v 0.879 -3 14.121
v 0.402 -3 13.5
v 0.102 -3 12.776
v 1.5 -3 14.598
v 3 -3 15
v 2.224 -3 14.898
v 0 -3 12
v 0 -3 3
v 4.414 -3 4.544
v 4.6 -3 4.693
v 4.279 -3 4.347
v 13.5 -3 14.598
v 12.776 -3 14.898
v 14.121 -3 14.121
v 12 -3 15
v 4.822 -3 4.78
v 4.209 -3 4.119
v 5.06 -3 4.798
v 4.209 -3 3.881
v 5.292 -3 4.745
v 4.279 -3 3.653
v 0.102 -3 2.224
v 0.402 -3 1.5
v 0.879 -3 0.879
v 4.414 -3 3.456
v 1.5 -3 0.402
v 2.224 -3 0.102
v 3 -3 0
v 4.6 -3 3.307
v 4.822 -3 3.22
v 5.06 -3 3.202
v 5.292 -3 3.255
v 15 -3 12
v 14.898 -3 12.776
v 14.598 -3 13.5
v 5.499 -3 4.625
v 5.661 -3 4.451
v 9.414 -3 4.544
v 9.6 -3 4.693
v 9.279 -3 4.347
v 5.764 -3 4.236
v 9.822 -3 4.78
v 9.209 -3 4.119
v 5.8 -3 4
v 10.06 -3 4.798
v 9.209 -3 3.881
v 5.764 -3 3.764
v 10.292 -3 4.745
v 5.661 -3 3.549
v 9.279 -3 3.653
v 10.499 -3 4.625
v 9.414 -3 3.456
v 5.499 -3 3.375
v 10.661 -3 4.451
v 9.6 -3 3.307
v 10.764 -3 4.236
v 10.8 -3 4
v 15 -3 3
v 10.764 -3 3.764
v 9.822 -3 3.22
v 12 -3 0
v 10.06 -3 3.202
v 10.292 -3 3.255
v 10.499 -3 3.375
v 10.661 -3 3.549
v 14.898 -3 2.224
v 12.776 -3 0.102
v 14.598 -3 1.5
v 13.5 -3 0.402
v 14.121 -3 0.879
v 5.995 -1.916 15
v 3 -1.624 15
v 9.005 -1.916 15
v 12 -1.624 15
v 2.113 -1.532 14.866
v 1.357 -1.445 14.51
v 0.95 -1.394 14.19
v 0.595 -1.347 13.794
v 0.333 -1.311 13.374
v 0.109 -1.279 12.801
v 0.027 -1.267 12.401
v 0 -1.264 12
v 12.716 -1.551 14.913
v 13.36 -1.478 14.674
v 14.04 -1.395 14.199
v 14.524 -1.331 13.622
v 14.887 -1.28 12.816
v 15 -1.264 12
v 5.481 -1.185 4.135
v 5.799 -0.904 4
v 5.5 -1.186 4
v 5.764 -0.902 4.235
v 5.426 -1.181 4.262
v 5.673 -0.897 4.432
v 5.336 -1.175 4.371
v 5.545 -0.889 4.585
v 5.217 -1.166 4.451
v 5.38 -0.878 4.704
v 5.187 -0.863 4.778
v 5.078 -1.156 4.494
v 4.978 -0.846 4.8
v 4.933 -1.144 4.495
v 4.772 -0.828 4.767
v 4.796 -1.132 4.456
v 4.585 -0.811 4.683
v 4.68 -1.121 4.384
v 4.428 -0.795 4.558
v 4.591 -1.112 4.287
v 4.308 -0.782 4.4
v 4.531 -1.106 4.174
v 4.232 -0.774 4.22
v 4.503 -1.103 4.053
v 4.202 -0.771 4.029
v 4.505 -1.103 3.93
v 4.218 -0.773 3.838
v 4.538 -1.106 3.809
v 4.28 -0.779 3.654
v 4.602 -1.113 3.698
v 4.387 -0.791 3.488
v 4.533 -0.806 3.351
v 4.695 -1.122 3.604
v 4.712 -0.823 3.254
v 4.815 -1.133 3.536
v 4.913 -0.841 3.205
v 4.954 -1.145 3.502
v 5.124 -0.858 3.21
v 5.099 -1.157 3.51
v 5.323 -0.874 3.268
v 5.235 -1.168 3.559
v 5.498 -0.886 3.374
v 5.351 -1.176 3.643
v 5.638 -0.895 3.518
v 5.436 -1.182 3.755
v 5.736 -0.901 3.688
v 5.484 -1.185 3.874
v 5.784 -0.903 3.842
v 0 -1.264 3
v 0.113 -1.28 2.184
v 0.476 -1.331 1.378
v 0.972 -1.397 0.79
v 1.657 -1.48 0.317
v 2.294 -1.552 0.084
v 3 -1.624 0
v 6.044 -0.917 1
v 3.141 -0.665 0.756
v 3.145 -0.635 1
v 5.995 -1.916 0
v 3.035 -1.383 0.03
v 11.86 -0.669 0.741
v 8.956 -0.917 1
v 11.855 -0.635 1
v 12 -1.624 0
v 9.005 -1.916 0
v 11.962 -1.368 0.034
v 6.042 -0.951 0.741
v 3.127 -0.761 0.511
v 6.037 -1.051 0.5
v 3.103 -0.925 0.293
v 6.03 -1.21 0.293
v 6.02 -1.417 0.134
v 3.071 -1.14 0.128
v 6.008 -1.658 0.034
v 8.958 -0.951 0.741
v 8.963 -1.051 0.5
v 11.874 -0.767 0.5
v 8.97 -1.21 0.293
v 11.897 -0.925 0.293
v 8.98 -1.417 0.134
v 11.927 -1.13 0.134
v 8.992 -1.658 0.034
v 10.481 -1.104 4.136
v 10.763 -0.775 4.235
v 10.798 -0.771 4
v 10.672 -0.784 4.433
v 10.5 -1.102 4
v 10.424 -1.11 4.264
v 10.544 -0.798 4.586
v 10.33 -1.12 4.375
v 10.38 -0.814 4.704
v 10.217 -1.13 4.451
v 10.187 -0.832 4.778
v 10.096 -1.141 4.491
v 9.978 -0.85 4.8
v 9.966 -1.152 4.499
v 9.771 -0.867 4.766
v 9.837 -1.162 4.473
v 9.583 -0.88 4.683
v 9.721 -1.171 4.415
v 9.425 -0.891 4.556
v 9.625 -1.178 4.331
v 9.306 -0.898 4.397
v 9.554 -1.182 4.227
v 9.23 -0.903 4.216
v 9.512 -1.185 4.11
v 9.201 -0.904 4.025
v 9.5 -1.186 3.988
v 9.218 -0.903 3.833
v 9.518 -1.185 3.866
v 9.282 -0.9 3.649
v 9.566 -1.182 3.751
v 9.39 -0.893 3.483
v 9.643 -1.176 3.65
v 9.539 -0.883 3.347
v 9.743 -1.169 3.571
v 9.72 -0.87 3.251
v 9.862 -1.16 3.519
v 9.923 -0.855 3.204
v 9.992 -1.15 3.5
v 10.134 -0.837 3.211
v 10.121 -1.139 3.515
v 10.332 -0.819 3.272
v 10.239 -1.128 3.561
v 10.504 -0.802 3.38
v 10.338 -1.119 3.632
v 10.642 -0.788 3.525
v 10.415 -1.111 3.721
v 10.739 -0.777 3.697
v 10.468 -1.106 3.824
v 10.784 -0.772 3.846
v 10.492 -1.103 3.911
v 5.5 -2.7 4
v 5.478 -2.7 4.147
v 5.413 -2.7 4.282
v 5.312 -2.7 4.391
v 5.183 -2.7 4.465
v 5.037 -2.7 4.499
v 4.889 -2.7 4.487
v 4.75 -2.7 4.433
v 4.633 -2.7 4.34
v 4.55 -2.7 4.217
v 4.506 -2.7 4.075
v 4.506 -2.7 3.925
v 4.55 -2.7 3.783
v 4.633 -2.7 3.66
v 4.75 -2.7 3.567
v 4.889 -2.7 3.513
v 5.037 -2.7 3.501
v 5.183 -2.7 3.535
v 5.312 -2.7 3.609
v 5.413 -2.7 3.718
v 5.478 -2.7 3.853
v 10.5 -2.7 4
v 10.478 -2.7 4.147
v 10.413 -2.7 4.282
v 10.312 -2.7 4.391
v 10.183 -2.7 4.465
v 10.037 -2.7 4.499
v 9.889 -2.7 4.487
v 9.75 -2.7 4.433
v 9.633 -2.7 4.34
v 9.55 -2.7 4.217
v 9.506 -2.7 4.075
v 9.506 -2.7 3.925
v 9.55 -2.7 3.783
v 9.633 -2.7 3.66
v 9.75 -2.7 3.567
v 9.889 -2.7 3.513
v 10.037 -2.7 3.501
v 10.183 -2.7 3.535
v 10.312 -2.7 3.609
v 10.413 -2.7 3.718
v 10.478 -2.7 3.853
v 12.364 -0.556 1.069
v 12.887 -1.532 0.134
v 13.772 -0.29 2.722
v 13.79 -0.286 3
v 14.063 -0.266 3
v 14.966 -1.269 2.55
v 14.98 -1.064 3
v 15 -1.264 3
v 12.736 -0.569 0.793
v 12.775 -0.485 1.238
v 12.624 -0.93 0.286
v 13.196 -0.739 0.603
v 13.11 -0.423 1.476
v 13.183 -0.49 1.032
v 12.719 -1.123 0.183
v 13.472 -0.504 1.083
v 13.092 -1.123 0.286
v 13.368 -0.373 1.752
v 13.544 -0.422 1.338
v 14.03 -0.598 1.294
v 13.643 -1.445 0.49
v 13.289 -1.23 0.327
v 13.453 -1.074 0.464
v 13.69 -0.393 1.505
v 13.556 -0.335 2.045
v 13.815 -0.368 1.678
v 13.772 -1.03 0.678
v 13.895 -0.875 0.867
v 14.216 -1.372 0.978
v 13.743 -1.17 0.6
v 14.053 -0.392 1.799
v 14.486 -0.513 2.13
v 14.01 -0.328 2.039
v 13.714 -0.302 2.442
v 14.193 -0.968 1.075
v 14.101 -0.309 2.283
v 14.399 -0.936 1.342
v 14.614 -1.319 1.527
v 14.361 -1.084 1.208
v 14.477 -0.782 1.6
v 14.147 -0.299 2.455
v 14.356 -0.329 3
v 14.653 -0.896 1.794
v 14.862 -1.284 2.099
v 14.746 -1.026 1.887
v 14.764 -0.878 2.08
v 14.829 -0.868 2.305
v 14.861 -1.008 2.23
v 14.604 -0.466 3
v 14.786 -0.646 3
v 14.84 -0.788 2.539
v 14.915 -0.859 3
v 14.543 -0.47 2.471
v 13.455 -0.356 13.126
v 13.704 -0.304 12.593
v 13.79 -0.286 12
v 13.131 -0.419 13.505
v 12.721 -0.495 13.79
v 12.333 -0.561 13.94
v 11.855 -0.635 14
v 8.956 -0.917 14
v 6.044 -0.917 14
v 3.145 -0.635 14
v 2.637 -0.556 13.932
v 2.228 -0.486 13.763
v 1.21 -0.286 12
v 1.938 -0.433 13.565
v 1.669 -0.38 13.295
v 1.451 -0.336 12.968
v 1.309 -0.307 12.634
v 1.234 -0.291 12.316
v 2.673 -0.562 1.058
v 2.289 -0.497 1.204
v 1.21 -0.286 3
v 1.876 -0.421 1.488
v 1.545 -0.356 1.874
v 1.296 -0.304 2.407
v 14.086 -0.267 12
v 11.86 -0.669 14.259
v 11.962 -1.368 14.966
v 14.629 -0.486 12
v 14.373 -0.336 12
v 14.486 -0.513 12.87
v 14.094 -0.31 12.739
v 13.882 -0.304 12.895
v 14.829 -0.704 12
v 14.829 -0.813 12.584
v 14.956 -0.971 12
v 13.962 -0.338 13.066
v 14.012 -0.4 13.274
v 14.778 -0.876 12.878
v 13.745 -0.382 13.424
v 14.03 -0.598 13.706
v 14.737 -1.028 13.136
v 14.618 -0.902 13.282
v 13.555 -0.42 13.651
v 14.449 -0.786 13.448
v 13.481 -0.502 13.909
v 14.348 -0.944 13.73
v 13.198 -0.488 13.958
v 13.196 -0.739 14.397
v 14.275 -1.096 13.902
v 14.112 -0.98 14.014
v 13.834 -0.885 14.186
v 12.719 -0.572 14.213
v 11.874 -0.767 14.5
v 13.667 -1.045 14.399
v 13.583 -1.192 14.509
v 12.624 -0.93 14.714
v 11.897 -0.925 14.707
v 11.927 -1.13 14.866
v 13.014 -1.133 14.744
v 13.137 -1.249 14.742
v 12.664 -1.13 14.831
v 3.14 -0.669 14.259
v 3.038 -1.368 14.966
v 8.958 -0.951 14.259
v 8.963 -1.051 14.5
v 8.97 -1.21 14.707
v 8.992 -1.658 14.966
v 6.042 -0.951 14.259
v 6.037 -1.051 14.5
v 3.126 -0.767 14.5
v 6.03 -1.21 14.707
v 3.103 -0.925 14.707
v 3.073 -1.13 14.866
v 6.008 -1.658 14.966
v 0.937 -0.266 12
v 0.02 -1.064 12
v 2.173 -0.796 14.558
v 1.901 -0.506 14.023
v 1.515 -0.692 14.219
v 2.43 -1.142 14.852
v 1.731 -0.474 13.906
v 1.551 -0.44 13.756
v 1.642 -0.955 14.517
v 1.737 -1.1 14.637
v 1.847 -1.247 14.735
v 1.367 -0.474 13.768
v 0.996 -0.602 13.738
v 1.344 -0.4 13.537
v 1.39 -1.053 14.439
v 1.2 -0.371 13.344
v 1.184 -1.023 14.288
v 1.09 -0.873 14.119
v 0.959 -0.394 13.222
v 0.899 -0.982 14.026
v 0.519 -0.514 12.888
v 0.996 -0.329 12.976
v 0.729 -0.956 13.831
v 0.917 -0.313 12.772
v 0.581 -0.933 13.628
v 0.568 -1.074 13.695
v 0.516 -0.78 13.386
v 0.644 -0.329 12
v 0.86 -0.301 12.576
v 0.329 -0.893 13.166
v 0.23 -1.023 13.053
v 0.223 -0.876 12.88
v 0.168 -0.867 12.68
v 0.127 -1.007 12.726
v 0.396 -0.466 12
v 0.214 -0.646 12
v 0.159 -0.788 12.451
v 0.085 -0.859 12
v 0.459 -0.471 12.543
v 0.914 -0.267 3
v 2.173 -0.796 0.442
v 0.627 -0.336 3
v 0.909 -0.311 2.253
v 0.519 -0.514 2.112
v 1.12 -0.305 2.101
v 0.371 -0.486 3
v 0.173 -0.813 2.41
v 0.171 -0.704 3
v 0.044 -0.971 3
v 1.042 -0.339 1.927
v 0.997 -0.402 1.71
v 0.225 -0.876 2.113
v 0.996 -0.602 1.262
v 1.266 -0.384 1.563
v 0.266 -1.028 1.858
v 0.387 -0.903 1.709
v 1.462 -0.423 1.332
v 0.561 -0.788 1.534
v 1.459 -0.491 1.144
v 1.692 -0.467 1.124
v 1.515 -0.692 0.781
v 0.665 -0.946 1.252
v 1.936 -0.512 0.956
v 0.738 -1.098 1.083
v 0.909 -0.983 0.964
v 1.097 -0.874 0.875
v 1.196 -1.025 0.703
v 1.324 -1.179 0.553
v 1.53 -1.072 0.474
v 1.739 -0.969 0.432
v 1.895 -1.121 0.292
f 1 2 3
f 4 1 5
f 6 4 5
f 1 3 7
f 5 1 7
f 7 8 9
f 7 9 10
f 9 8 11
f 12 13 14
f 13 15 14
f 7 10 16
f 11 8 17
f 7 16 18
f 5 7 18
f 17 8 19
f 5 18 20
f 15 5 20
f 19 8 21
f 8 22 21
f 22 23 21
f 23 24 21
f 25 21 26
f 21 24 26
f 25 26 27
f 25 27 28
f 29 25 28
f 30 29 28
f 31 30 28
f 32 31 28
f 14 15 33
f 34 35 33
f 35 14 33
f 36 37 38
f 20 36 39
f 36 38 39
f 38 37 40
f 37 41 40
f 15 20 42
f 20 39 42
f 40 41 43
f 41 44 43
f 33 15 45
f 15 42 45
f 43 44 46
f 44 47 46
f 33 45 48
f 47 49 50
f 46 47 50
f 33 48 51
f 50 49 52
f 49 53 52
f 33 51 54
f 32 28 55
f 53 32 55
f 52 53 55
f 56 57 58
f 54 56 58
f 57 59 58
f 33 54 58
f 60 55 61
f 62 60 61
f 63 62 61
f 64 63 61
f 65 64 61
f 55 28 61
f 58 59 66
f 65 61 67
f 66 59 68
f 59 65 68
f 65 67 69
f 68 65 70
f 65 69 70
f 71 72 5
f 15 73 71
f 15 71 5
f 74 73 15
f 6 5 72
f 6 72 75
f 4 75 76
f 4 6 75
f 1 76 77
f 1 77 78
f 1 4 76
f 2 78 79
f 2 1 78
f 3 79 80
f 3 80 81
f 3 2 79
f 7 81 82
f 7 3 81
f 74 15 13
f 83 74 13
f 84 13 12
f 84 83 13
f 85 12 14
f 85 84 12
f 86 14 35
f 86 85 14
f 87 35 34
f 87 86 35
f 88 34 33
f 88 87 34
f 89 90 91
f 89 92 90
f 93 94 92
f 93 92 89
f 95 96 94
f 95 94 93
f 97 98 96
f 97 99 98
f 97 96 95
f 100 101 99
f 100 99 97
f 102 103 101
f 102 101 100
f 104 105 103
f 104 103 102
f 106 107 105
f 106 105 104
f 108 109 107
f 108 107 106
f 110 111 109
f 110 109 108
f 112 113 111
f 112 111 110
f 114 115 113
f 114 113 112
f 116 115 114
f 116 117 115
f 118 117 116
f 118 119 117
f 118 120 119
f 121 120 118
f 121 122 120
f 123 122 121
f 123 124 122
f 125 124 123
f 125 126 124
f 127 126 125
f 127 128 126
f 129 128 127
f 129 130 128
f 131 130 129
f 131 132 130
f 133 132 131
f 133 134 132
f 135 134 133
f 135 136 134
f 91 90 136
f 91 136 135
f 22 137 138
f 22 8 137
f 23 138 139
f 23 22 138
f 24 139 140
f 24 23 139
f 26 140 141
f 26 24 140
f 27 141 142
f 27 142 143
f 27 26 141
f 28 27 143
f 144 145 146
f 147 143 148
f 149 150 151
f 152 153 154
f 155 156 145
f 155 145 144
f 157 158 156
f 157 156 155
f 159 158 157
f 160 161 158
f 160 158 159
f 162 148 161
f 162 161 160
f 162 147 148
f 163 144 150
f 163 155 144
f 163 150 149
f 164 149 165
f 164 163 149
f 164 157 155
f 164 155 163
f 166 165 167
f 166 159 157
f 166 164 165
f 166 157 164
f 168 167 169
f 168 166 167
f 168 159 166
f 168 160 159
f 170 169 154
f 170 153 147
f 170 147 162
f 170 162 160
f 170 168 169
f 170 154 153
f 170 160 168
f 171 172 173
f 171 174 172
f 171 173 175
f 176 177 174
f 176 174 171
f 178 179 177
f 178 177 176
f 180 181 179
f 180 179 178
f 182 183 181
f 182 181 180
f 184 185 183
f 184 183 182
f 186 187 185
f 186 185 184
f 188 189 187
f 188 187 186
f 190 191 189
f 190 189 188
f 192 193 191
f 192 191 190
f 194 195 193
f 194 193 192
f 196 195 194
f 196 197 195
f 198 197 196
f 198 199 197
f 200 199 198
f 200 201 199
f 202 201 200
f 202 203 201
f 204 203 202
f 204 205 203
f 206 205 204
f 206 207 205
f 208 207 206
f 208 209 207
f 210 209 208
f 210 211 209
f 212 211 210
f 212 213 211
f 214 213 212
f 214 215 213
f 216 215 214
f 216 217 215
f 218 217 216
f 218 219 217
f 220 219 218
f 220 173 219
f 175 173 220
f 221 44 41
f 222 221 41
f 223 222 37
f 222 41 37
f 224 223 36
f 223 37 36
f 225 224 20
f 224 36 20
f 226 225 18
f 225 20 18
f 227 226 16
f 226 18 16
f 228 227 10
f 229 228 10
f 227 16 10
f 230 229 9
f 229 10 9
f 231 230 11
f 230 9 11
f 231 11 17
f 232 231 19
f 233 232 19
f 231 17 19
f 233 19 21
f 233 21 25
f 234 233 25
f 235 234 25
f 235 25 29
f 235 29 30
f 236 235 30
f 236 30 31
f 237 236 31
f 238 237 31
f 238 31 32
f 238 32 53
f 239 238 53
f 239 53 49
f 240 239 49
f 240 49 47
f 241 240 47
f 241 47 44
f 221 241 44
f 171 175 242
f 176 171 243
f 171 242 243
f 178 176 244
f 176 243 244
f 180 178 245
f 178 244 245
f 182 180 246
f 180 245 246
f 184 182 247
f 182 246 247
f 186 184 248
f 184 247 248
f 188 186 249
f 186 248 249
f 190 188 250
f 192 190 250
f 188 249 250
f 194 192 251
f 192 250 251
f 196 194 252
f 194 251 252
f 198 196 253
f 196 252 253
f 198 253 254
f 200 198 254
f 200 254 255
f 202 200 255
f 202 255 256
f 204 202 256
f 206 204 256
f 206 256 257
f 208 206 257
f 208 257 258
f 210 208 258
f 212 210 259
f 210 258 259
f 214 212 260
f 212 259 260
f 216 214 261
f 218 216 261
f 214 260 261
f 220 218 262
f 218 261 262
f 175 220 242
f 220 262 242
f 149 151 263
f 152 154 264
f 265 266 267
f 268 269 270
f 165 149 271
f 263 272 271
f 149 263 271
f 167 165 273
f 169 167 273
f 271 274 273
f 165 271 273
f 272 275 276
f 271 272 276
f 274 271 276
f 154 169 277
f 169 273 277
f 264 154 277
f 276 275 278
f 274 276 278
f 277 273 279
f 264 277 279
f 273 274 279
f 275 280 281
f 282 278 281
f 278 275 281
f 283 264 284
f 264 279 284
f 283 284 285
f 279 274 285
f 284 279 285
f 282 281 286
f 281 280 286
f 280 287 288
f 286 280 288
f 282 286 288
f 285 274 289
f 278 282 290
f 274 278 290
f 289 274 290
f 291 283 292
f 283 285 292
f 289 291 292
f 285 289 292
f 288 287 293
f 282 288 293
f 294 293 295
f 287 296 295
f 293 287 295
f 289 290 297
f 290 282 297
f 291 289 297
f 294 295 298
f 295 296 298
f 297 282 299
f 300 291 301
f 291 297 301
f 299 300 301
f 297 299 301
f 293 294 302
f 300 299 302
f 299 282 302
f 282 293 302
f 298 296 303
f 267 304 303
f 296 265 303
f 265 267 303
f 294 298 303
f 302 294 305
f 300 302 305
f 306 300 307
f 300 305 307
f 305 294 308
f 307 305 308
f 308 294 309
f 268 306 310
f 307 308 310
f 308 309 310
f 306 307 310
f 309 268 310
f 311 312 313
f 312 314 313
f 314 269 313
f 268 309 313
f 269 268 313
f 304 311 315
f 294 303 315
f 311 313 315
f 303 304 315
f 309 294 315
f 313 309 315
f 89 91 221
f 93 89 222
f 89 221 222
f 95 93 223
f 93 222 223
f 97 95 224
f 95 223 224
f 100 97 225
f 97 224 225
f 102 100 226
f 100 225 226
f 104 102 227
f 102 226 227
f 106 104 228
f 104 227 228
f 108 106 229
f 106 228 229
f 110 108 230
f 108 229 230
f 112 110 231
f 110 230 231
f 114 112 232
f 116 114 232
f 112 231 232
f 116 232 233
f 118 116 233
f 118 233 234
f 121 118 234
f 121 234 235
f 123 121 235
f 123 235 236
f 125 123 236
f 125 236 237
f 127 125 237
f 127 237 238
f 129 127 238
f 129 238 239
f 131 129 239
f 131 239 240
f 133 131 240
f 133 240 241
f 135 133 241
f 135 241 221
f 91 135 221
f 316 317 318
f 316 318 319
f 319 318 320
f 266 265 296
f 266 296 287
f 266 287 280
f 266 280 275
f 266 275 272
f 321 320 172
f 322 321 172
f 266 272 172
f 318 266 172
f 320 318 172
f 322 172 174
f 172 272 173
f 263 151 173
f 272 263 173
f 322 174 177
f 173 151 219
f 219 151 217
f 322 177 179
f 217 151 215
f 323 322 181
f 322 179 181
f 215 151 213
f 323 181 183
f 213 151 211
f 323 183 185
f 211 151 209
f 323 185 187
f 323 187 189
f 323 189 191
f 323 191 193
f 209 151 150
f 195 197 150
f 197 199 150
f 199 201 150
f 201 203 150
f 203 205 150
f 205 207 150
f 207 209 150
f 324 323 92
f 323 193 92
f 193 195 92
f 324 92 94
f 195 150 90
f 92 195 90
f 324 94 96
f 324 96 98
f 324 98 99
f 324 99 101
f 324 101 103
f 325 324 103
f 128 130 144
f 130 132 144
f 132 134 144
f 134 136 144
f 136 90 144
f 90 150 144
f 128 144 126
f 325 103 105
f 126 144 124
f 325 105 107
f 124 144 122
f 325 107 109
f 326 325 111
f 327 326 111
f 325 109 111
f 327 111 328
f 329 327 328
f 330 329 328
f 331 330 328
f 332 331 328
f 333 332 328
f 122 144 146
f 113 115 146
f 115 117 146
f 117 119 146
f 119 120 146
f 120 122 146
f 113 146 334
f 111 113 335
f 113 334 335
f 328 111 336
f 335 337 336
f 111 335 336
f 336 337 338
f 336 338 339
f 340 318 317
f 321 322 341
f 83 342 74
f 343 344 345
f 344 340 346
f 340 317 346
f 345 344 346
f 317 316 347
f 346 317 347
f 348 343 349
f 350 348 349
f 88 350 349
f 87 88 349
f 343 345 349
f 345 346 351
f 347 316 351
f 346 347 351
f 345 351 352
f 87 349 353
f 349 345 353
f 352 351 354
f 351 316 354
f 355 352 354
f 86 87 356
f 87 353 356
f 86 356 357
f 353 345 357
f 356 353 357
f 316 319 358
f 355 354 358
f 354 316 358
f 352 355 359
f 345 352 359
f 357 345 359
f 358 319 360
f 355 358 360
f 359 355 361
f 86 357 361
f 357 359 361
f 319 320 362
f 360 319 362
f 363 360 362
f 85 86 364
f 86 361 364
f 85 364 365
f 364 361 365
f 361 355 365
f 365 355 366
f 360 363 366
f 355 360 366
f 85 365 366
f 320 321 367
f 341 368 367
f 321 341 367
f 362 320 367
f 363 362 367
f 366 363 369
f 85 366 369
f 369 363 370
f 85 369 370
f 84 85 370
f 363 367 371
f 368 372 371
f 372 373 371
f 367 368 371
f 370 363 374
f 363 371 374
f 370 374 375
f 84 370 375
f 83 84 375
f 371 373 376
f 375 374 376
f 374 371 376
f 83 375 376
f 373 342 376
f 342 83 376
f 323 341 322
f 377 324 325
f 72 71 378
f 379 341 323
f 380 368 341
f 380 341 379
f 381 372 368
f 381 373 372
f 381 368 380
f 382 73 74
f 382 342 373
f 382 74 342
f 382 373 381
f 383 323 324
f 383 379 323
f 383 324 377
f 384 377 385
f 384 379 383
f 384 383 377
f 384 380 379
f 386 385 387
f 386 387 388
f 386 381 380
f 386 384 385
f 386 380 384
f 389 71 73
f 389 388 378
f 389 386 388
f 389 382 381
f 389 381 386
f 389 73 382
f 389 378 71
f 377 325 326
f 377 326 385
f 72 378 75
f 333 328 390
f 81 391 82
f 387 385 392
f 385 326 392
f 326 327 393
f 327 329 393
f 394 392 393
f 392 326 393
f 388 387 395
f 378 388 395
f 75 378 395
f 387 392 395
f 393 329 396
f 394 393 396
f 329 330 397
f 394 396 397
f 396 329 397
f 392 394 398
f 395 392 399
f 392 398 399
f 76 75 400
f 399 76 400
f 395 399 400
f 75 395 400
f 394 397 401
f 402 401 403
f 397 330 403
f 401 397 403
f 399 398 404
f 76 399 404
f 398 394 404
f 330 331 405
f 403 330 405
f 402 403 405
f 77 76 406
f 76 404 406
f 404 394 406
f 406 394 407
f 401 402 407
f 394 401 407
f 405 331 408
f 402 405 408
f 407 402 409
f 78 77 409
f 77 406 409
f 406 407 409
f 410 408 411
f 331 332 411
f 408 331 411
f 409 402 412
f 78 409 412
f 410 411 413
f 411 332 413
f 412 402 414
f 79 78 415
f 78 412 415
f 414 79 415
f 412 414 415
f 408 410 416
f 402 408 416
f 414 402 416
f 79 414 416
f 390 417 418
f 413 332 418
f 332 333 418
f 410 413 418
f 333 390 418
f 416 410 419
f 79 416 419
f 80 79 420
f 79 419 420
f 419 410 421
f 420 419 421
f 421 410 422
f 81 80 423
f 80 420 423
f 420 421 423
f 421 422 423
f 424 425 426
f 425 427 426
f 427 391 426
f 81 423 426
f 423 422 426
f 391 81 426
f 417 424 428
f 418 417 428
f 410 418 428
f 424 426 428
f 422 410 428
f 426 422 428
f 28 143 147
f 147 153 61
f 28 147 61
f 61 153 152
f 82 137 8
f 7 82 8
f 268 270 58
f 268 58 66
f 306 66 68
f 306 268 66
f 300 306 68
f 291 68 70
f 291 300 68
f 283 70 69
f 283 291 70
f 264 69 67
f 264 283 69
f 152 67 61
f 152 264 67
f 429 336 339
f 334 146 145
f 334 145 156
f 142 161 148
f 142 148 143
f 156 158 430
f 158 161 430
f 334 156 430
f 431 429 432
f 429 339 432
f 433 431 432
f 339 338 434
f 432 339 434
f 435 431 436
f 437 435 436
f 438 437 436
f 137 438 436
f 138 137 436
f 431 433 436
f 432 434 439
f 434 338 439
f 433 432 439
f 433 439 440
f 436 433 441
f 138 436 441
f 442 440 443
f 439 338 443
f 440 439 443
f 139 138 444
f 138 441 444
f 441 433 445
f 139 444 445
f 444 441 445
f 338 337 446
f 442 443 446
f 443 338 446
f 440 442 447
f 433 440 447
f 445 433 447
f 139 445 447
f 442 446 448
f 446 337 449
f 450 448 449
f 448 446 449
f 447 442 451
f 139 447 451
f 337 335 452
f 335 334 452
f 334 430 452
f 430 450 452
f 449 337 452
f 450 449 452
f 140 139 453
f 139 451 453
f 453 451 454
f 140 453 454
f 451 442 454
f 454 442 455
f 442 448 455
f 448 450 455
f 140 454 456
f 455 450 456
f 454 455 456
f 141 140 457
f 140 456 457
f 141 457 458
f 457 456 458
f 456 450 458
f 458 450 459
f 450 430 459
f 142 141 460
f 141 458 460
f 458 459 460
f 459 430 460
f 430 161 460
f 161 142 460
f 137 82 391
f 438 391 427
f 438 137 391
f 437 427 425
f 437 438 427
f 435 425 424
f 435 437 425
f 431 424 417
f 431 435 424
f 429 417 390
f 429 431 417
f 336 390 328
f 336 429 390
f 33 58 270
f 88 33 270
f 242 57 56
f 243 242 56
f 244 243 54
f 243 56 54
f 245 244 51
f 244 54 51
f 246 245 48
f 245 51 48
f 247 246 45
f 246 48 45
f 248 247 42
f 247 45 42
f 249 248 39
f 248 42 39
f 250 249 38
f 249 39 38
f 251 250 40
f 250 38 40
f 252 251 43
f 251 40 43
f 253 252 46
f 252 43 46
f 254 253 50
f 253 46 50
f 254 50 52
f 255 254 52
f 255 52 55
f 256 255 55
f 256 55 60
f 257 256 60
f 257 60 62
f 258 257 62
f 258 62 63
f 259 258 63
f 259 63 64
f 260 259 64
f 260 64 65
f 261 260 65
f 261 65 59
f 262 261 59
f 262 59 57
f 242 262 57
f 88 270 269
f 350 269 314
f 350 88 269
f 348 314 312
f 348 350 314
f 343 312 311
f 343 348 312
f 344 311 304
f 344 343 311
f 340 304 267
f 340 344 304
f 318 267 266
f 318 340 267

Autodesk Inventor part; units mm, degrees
ref_plane "YZ Plane" through (0, 0, 0) normal (1, 0, 0) x (0, 1, 0)
ref_plane "XZ Plane" through (0, 0, 0) normal (0, 1, 0) x (-1, 0, 0)
ref_plane "XY Plane" through (0, 0, 0) normal (0, 0, 1) x (1, 0, 0)
sketch "Sketch1" plane through (0, 0, 0) normal (0, 0, 1) x (1, 0, 0)
  arc A0 (0, 0) -> (15, 0) centre (7.5, 29.0474) ccw
  line L0 (0, 0) -> (0, -3)
  line L1 (0, -3) -> (15, -3)
  line L2 (15, -3) -> (15, 0)
  line L3 (15, 0) -> (0, 0) construction
  dimension "d0" = 15
  dimension "d1" = 30
  dimension "d2" = 3
extrude "Extrusion1" add sketch "Sketch1" along normal blind 15
fillet "Fillet1" radius 3 4 edges at (15, -1.5, 15) (0, -1.5, 15) (0, -1.5, 0) (15, -1.5, 0)
fillet "Fillet2" radius 1 8 edges at (14.2673, -0.1794, 13.9645) (7.5, -0.9526, 15) (0.7332, -0.1795, 13.9651) (0, 0, 7.5) (0.7332, -0.1795, 1.0349) (7.5, -0.9526, 0) (14.2673, -0.1794, 1.0355) (15, 0, 7.5)
sketch "Sketch2" plane through (3, -3, 0) normal (0, -1, 0) x (1, 0, 0)
  line L0 (0, 0) -> (9, 0) projected
  line L1 (4.5, 0) -> (4.5, 4) construction
  line L2 (4.5, 4) -> (2, 4) construction
  line L3 (4.5, 4) -> (7, 4) construction
  circle A0 centre (2, 4) radius 0.5
  circle A1 centre (7, 4) radius 0.5
  point P0 (-3, 0)
  dimension "d7" = 1
  dimension "d8" = 5
  dimension "d9" = 4
extrude "Extrusion2" cut sketch "Sketch2" against normal through all
chamfer "Chamfer1" distance 0.3 angle 45 4 edges at (9.5, -3, 4) (4.5, -3, 4) (9.5, -0.8859, 4) (4.5, -0.8022, 4)
properties part number "fakekeycap"
